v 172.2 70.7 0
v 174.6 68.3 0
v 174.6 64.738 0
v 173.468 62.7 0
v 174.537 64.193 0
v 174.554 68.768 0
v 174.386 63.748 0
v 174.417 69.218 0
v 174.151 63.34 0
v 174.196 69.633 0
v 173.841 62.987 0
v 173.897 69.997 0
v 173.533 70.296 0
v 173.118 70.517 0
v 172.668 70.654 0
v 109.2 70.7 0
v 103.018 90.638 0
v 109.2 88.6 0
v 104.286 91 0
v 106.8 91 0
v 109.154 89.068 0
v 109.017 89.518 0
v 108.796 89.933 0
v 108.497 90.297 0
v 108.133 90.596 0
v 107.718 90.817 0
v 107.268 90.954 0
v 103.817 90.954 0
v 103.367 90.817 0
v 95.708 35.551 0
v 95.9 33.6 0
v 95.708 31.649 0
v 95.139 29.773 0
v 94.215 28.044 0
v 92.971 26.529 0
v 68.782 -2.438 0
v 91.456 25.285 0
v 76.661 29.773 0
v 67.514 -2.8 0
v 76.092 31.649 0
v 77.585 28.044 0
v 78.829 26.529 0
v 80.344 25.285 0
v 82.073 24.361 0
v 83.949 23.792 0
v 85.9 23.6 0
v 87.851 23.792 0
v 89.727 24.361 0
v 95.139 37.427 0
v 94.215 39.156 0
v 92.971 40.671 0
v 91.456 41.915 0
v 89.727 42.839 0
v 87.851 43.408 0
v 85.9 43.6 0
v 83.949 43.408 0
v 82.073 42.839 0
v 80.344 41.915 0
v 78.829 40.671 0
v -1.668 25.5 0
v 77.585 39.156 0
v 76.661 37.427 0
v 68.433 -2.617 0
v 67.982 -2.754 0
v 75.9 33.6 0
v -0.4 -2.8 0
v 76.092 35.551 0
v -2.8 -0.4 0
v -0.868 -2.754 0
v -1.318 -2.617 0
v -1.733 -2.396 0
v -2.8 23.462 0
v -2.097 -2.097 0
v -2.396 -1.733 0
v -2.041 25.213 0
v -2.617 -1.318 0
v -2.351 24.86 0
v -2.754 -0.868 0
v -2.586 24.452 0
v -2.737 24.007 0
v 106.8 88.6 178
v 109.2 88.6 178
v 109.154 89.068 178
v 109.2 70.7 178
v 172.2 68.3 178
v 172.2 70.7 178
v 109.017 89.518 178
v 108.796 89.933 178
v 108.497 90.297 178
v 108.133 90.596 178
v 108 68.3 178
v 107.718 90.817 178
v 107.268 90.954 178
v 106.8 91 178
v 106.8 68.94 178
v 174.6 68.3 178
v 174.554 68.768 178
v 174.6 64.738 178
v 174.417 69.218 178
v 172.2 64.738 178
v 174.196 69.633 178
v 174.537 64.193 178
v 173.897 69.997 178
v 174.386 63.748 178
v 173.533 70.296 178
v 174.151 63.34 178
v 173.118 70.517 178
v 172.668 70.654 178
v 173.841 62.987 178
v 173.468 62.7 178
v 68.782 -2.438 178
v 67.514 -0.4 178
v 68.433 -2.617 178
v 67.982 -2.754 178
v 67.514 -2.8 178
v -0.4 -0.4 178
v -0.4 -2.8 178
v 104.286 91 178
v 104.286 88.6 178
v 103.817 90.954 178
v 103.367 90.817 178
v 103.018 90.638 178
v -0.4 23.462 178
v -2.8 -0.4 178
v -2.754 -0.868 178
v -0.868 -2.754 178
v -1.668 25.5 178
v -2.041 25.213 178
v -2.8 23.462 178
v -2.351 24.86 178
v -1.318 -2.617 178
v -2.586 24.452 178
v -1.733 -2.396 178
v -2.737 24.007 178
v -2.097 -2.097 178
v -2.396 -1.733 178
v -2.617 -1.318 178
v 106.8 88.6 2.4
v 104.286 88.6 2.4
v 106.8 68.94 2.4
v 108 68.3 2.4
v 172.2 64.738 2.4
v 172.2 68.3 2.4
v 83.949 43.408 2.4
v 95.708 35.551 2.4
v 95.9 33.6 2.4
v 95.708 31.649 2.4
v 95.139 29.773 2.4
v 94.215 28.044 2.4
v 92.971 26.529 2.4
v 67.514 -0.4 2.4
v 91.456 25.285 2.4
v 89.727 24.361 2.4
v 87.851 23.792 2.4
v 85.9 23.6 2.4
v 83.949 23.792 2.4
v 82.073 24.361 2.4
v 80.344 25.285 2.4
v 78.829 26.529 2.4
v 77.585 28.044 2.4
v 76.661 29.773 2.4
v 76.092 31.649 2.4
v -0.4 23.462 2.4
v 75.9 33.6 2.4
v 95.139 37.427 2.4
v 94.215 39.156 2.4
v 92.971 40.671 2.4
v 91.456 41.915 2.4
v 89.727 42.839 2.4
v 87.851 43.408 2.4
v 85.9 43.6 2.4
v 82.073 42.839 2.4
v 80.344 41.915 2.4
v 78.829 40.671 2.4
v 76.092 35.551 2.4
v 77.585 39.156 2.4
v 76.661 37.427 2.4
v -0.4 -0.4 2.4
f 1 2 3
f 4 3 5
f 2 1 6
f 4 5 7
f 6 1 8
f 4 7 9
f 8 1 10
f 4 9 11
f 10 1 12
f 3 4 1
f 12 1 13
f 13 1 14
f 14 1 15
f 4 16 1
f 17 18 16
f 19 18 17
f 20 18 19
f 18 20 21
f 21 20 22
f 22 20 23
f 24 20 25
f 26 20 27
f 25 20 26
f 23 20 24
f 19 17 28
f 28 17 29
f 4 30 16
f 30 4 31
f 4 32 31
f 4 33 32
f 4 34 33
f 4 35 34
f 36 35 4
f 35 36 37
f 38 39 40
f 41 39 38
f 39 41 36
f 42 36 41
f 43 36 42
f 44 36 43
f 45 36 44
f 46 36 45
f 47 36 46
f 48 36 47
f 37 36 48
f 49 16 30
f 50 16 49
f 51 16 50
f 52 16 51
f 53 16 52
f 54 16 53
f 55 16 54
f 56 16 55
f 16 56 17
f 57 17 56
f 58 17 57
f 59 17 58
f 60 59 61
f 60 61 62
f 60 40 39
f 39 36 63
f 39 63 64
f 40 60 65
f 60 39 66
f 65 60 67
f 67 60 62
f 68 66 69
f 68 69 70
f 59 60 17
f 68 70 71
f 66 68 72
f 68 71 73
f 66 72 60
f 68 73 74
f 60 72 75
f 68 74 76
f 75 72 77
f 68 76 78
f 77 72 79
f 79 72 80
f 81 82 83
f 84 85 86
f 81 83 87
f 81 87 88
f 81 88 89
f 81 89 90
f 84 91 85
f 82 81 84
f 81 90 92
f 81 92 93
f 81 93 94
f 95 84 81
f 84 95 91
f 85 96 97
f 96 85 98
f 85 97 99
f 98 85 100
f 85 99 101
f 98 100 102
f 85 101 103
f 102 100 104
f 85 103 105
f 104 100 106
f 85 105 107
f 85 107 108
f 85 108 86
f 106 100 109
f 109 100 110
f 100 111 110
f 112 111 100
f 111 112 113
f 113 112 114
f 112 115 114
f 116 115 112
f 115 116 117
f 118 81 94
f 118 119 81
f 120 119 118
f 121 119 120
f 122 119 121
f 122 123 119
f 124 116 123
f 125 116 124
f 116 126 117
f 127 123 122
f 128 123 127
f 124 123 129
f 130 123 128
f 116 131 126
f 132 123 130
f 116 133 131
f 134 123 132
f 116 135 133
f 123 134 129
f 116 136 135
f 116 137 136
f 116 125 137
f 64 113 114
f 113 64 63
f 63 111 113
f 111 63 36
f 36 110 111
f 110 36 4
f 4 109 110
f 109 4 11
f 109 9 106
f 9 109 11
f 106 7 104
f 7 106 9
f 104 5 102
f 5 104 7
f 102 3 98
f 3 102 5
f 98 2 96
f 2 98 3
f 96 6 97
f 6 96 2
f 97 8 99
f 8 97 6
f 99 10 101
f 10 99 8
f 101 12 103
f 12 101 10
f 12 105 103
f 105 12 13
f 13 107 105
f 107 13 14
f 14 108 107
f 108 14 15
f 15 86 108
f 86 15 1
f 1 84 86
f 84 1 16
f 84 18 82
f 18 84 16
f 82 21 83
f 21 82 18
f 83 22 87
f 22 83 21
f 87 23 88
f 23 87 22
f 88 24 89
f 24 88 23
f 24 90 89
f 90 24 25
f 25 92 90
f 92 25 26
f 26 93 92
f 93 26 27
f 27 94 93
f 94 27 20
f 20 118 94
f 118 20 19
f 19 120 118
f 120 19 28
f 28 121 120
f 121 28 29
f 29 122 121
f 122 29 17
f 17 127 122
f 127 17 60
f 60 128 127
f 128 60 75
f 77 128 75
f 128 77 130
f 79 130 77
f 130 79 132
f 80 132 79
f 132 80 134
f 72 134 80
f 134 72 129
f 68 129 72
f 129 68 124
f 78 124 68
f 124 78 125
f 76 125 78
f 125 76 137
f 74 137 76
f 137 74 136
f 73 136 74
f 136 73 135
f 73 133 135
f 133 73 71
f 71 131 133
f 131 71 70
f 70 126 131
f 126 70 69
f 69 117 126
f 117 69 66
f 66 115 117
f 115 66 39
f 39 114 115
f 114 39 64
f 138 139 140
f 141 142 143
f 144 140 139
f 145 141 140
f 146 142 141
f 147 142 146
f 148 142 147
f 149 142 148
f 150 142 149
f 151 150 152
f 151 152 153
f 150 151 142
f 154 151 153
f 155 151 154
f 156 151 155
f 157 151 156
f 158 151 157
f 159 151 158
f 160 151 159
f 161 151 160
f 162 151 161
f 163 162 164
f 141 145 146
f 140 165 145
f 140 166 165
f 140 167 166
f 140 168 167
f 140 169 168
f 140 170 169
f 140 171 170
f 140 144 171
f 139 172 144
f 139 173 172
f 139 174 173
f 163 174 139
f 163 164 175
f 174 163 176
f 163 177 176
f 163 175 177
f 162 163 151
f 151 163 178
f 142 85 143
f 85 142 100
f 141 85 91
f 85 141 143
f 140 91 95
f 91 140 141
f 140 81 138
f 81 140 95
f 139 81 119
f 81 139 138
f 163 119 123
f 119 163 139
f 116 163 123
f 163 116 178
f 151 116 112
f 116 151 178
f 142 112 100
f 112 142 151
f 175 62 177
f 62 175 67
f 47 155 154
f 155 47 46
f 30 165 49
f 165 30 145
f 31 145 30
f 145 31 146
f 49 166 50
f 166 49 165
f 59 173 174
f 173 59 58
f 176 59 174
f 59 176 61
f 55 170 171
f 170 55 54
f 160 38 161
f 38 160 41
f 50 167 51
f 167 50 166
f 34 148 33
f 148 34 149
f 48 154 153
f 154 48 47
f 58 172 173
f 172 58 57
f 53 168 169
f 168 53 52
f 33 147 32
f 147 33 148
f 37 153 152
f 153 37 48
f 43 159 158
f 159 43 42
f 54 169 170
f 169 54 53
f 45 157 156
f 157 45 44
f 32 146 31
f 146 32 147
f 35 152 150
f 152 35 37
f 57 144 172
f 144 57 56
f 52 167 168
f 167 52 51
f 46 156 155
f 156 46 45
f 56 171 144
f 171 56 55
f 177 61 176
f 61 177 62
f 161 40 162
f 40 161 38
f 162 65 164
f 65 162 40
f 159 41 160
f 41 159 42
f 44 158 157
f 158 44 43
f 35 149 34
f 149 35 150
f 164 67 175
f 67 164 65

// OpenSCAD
// Wake case v1: side-sliding sleeve for a shingled stack of risers.
// The stack has a constant cross-section along x, so the sleeve is one extrusion of the stack outline,
// printed standing up (axis vertical): no overhangs, closed end at the bottom, open end at the top.
// Standalone: the riser definitions from flat_riser_v2.scad are pasted in below, so this one file opens on its own.
// If the riser changes, copy the changes into the riser section (everything above 'Wake case v1 settings').


// ======== riser definitions (copied from flat_riser_v2.scad) ========
// Wake flat v2: built on the v6 design. One-piece L riser printed flat, plate on the bed, lip standing up.
// Kept exactly from v6: plate size (65.4 mm deep x width), 2.24 mm plate (2 + 0.24 extra back layers),
//   hex size/gap/borders/grid positions, the small W, and the lip size (2 mm thick, 20 mm deep from the front face).
// New: wall tabs on the lip top that rest by gravity in slots near the free edge of the next plate.
// No ridges, channels or bands.
//
// Axes: x = width, y = plate depth (y=0 is the lip end of the plate, v6's z_bot end), z = up (plate front face up).
// The x axis is mirrored relative to v6's panel coordinates so the part is the same physical part, not a mirror image.

half_length = false;                      // true = half-length prototype (87.5 mm)
width       = half_length ? 87.5 : 175;

// v6 plate: back_height 70.5 - panel_top_trim 1.0 - boss_h 4.1
panel_h  = 65.4;
edge_extra = 2;                           // extra solid border past the v6 plate edge (free-edge side only); hex grid and slot positions unchanged
plate_d  = panel_h + edge_extra;
wall     = 2;                             // lip thickness (v6 `wall`)
back_extra = 0.24;                        // v6: 2 * 0.12 extra layers on the back
plate_t  = wall + back_extra;
bottom_lip_depth = 20;                    // v6 lip depth, measured from the back face's y datum
lip_h    = bottom_lip_depth + back_extra; // lip height from the bed: sticks out 18 mm past the front face, same as v6
fillet_in = 1.5;                          // where the lip meets the plate

// hex grid, same as v6
hex_size   = 15;
hex_gap    = 2.5;
border_x   = 4;
border_top = 6;
band_h     = 5;                           // v6 band_v 2 + ramp_h 3: hex area starts this far from the lip end

// small W, same as v6: one hex at the far corner, max x and max v6-z
small_w_on     = true;
small_w_w      = 0.85;
small_w_h      = 0.62;
small_w_stroke = 2.0;
letter_flip    = true;

// tabs on the lip top, slots in the plate
tab_len     = 22;
tab_h       = 3;                          // tabs stick up past lip_h
tab_clear   = 0.2;                        // slot clearance per side
slot_from_edge = 3;                       // free edge to slot centre line (hex area ends border_top = 6 from the edge)
ramp_depth = 1.0;                         // funnel depth into the plate from the back face, leaves plate_t - ramp_depth straight
ramp_run_y = 1.4;                         // flare on the hex side of each slot only, none on the free-edge side (stops short of the hex area at 1.8 mm)
ramp_run_x = 3.0;                         // flare past each end, gentler lead-in

// storage stack: pieces lie plate on plate, each shifted by stack_step along y so the lips step up like shingles.
// stack_step is the TIGHT position: the plate above is pushed up against the lip wall and fillet below it (3.5 mm),
// plus 0.1 so the groove clearance is centred on the printed contact. A trapezoid rib on the front face, in each
// side border, drops by gravity into a matching groove in the back face of the plate above, so the pieces
// lock as soon as the lips are pushed together.
stack_on   = true;
stack_step = 3.6;
rib_x      = 2;                           // rib centre line from each side edge (border_x = 4)
groove_y0  = 6;                           // groove start in the back face, measured from the lip end of the plate
rib_y0     = groove_y0 + stack_step;      // rib start on the front face: the groove position plus the shingle shift
rib_len    = 20;
rib_w      = 1.5;                         // base width
rib_top_w  = 0.7;
rib_h      = 0.7;
rib_clear  = 0.2;                         // groove clearance, all round
rib_s      = (rib_w - rib_top_w) / 2 / rib_h;   // side slope, horizontal run per mm of height
assert(stack_step >= wall + fillet_in, "stack_step too small to clear the lip wall and fillet");
assert(groove_y0 - rib_clear >= wall + fillet_in, "groove would run under the lip wall");

tab_xs = [width / 4, 3 * width / 4];     // two tabs, at the quarter points (full width: 43.75 and 131.25)

// engraved logo and version on the front face, in the solid strip along the free edge, either side of the slots
engrave      = true;
brand_text   = "BlueBytes";
version_text = "Wake v30";
tag_size     = 3.5;
tag_depth    = 0.5;
tag_font     = "Liberation Sans:style=Bold";

$fn = 32;

function cells(w, h) =
    let (pitch = hex_size + hex_gap, step_x = pitch * 0.75, step_z = pitch * 0.866,
         cx = w / 2, cz = h / 2,
         ncols = ceil(w / (2 * step_x)) + 2, nrows = ceil(h / (2 * step_z)) + 2)
    [for (col = [-ncols : ncols]) for (row = [-nrows : nrows])
        let (parity = ((col % 2) + 2) % 2,
             x = cx + col * step_x,
             z = cz + row * step_z + (parity == 0 ? 0 : step_z / 2))
        [x, z]];

function corner_cell(w, h) =
    let (c = [for (p = cells(w, h)) if (p[0] - hex_size / 2 >= 0 && p[0] + hex_size / 2 <= w && p[1] - hex_size / 2 >= 0 && p[1] + hex_size / 2 <= h) p],
         best = max([for (p = c) p[0] + p[1]]))
    [for (p = c) if (p[0] + p[1] == best) p][0];

module w_shape2d(lw, lh, stroke) {
    f = letter_flip ? -1 : 1;
    pts = [[-lw / 2, f * lh / 2], [-lw / 4, -f * lh / 2], [0, f * lh * 0.15], [lw / 4, -f * lh / 2], [lw / 2, f * lh / 2]];
    for (i = [0 : 3]) hull() {
        translate(pts[i]) circle(d = stroke, $fn = 24);
        translate(pts[i + 1]) circle(d = stroke, $fn = 24);
    }
}

// the v6 hex pattern as a 2D cut; the cell grid is symmetric in x, only the W cell is mirrored
module hex_cut2d(w, h) {
    cc = corner_cell(w, h);
    difference() {
        intersection() {
            for (c = cells(w, h)) translate(c) circle(d = hex_size, $fn = 6);
            square([w, h]);
        }
        if (small_w_on)
            translate([w - cc[0], cc[1]]) w_shape2d(hex_size * small_w_w, hex_size * small_w_h, small_w_stroke);
    }
}

// (y, z) profile of plate + lip + fillet, extruded along x
module body() {
    r = wall / 2;
    rotate([90, 0, 90]) linear_extrude(width) union() {
        square([plate_d, plate_t]);
        square([wall, lip_h - r]);
        translate([r, lip_h - r]) circle(r = r, $fn = 32);       // rounded lip top, as in v6
        difference() {
            translate([wall - 0.01, plate_t - 0.01]) square([fillet_in + 0.01, fillet_in + 0.01]);
            translate([wall + fillet_in, plate_t + fillet_in]) circle(r = fillet_in);
        }
    }
}

module tabs() {
    r = wall / 2;
    z0 = lip_h - r;                       // starts inside the rounded lip top
    for (x = tab_xs)
        translate([x - tab_len / 2, 0, 0]) rotate([90, 0, 90]) linear_extrude(tab_len) union() {
            translate([0, z0]) square([wall, tab_h]);                         // up to where the round starts
            translate([r, lip_h + tab_h - r]) circle(r = r, $fn = 32);        // rounded tab top, same radius as the lip
        }
}

module slots() {
    sw = wall + 2 * tab_clear;
    sl = tab_len + 2 * tab_clear;
    y0 = panel_h - slot_from_edge - sw / 2;
    for (x = tab_xs) {
        translate([x - sl / 2, y0, -1]) cube([sl, sw, plate_t + 2]);
        // lead-in funnel on the back face (z=0, the bed side), the face the tab enters from
        hull() {
            translate([x - sl / 2, y0, ramp_depth - 0.01]) cube([sl, sw, 0.01]);
            translate([x - sl / 2 - ramp_run_x, y0 - ramp_run_y, -0.01]) cube([sl + 2 * ramp_run_x, sw + ramp_run_y, 0.01]);
        }
    }
}

module tag_text(txt, x_pos) {
    translate([x_pos, panel_h - slot_from_edge, plate_t - tag_depth]) rotate([0, 0, 180])
        linear_extrude(height = tag_depth + 0.5)
            text(txt, size = tag_size, font = tag_font, halign = "center", valign = "center");
}

module frustum(cx, cy, w0, l0, h, s) {
    hull() {
        translate([cx - w0 / 2, cy - l0 / 2, 0]) cube([w0, l0, 0.01]);
        translate([cx - w0 / 2 + s * h, cy - l0 / 2 + s * h, h - 0.01]) cube([w0 - 2 * s * h, l0 - 2 * s * h, 0.01]);
    }
}

module ribs() {
    for (x = [rib_x, width - rib_x])
        translate([0, 0, plate_t - 0.01]) frustum(x, rib_y0 + rib_len / 2, rib_w, rib_len, rib_h + 0.01, rib_s);
}

module rib_grooves() {
    for (x = [rib_x, width - rib_x])
        translate([0, 0, -0.01]) frustum(x, groove_y0 + rib_len / 2, rib_w + 2 * rib_clear, rib_len + 2 * rib_clear, rib_h + 0.11, rib_s);
}

module riser() {
    difference() {
        union() { body(); tabs(); if (stack_on) ribs(); }
        translate([border_x, band_h, -1]) linear_extrude(plate_t + 2)
            hex_cut2d(width - 2 * border_x, panel_h - band_h - border_top);
        slots();
        if (stack_on) rib_grooves();
        if (engrave) {
            left_end  = tab_xs[0] - (tab_len / 2 + tab_clear);
            right_beg = tab_xs[1] + (tab_len / 2 + tab_clear);
            tag_text(brand_text, (border_x + left_end) / 2);
            tag_text(version_text, (right_beg + width - border_x) / 2);
        }
    }
}

// ======== Wake case v1 settings ========
case_part  = "print";    // "print" | "assembled" (sleeve plus a stack of stack_n pieces, for checking the fit)
stack_n    = 30;         // pieces the sleeve is sized for
slice_len  = 0;          // 0 = full length; e.g. 40 = short fit-test slice
case_clear = 0.4;        // gap between the stack and the sleeve walls; the snugness knob
case_wall  = 2.4;        // sleeve wall
cap_t      = 2.4;        // closed end thickness
end_clear  = 0.6;        // slack along x
cap_hole_d = 20;         // finger hole through the closed end, to push the stack out (0 = none)

top_z   = (stack_n - 1) * plate_t + lip_h + tab_h;
rib_top = stack_on ? rib_h : 0;    // the top piece's ribs stick up past its plate
case_len = cap_t + (slice_len > 0 ? slice_len : width + end_clear);

// stack outline in (y, z): bottom plate flat, right edge through the free-edge corners, left edge through the lip tops
function stack_poly(n) = [
    [0, 0],
    [plate_d, 0],
    [plate_d + (n - 1) * stack_step, (n - 1) * plate_t],
    [plate_d + (n - 1) * stack_step, n * plate_t + rib_top],
    [(n - 1) * stack_step + wall + fillet_in, n * plate_t + rib_top],
    [(n - 1) * stack_step + wall, n * plate_t + fillet_in],
    [(n - 1) * stack_step + wall, top_z],
    [(n - 1) * stack_step, top_z],
    [0, lip_h + tab_h]
];

module profile_cavity() { offset(delta = case_clear) polygon(stack_poly(stack_n)); }
module profile_outer()  { offset(r = case_wall) profile_cavity(); }

module case_body() {
    hy = (stack_n - 1) / 2 * stack_step + plate_d / 2;
    hz = (stack_n - 1) / 2 * plate_t + plate_t / 2;
    difference() {
        linear_extrude(case_len) profile_outer();
        translate([0, 0, cap_t]) linear_extrude(case_len) profile_cavity();
        if (cap_hole_d > 0) translate([hy, hz, -1]) cylinder(d = min(cap_hole_d, 5 + 0.5 * (stack_n - 1) * plate_t), h = cap_t + 2);
    }
}

// riser (x, y, z) -> sleeve (y, z, x): the stack lying in the sleeve, the cap at x = 0
module stack_in_case() {
    for (k = [0 : stack_n - 1])
        multmatrix([[0, 1, 0, k * stack_step],
                    [0, 0, 1, k * plate_t],
                    [1, 0, 0, cap_t + end_clear / 2],
                    [0, 0, 0, 1]]) riser();
}

if (case_part == "assembled") { %case_body(); stack_in_case(); }
else if (case_part == "print") case_body();
